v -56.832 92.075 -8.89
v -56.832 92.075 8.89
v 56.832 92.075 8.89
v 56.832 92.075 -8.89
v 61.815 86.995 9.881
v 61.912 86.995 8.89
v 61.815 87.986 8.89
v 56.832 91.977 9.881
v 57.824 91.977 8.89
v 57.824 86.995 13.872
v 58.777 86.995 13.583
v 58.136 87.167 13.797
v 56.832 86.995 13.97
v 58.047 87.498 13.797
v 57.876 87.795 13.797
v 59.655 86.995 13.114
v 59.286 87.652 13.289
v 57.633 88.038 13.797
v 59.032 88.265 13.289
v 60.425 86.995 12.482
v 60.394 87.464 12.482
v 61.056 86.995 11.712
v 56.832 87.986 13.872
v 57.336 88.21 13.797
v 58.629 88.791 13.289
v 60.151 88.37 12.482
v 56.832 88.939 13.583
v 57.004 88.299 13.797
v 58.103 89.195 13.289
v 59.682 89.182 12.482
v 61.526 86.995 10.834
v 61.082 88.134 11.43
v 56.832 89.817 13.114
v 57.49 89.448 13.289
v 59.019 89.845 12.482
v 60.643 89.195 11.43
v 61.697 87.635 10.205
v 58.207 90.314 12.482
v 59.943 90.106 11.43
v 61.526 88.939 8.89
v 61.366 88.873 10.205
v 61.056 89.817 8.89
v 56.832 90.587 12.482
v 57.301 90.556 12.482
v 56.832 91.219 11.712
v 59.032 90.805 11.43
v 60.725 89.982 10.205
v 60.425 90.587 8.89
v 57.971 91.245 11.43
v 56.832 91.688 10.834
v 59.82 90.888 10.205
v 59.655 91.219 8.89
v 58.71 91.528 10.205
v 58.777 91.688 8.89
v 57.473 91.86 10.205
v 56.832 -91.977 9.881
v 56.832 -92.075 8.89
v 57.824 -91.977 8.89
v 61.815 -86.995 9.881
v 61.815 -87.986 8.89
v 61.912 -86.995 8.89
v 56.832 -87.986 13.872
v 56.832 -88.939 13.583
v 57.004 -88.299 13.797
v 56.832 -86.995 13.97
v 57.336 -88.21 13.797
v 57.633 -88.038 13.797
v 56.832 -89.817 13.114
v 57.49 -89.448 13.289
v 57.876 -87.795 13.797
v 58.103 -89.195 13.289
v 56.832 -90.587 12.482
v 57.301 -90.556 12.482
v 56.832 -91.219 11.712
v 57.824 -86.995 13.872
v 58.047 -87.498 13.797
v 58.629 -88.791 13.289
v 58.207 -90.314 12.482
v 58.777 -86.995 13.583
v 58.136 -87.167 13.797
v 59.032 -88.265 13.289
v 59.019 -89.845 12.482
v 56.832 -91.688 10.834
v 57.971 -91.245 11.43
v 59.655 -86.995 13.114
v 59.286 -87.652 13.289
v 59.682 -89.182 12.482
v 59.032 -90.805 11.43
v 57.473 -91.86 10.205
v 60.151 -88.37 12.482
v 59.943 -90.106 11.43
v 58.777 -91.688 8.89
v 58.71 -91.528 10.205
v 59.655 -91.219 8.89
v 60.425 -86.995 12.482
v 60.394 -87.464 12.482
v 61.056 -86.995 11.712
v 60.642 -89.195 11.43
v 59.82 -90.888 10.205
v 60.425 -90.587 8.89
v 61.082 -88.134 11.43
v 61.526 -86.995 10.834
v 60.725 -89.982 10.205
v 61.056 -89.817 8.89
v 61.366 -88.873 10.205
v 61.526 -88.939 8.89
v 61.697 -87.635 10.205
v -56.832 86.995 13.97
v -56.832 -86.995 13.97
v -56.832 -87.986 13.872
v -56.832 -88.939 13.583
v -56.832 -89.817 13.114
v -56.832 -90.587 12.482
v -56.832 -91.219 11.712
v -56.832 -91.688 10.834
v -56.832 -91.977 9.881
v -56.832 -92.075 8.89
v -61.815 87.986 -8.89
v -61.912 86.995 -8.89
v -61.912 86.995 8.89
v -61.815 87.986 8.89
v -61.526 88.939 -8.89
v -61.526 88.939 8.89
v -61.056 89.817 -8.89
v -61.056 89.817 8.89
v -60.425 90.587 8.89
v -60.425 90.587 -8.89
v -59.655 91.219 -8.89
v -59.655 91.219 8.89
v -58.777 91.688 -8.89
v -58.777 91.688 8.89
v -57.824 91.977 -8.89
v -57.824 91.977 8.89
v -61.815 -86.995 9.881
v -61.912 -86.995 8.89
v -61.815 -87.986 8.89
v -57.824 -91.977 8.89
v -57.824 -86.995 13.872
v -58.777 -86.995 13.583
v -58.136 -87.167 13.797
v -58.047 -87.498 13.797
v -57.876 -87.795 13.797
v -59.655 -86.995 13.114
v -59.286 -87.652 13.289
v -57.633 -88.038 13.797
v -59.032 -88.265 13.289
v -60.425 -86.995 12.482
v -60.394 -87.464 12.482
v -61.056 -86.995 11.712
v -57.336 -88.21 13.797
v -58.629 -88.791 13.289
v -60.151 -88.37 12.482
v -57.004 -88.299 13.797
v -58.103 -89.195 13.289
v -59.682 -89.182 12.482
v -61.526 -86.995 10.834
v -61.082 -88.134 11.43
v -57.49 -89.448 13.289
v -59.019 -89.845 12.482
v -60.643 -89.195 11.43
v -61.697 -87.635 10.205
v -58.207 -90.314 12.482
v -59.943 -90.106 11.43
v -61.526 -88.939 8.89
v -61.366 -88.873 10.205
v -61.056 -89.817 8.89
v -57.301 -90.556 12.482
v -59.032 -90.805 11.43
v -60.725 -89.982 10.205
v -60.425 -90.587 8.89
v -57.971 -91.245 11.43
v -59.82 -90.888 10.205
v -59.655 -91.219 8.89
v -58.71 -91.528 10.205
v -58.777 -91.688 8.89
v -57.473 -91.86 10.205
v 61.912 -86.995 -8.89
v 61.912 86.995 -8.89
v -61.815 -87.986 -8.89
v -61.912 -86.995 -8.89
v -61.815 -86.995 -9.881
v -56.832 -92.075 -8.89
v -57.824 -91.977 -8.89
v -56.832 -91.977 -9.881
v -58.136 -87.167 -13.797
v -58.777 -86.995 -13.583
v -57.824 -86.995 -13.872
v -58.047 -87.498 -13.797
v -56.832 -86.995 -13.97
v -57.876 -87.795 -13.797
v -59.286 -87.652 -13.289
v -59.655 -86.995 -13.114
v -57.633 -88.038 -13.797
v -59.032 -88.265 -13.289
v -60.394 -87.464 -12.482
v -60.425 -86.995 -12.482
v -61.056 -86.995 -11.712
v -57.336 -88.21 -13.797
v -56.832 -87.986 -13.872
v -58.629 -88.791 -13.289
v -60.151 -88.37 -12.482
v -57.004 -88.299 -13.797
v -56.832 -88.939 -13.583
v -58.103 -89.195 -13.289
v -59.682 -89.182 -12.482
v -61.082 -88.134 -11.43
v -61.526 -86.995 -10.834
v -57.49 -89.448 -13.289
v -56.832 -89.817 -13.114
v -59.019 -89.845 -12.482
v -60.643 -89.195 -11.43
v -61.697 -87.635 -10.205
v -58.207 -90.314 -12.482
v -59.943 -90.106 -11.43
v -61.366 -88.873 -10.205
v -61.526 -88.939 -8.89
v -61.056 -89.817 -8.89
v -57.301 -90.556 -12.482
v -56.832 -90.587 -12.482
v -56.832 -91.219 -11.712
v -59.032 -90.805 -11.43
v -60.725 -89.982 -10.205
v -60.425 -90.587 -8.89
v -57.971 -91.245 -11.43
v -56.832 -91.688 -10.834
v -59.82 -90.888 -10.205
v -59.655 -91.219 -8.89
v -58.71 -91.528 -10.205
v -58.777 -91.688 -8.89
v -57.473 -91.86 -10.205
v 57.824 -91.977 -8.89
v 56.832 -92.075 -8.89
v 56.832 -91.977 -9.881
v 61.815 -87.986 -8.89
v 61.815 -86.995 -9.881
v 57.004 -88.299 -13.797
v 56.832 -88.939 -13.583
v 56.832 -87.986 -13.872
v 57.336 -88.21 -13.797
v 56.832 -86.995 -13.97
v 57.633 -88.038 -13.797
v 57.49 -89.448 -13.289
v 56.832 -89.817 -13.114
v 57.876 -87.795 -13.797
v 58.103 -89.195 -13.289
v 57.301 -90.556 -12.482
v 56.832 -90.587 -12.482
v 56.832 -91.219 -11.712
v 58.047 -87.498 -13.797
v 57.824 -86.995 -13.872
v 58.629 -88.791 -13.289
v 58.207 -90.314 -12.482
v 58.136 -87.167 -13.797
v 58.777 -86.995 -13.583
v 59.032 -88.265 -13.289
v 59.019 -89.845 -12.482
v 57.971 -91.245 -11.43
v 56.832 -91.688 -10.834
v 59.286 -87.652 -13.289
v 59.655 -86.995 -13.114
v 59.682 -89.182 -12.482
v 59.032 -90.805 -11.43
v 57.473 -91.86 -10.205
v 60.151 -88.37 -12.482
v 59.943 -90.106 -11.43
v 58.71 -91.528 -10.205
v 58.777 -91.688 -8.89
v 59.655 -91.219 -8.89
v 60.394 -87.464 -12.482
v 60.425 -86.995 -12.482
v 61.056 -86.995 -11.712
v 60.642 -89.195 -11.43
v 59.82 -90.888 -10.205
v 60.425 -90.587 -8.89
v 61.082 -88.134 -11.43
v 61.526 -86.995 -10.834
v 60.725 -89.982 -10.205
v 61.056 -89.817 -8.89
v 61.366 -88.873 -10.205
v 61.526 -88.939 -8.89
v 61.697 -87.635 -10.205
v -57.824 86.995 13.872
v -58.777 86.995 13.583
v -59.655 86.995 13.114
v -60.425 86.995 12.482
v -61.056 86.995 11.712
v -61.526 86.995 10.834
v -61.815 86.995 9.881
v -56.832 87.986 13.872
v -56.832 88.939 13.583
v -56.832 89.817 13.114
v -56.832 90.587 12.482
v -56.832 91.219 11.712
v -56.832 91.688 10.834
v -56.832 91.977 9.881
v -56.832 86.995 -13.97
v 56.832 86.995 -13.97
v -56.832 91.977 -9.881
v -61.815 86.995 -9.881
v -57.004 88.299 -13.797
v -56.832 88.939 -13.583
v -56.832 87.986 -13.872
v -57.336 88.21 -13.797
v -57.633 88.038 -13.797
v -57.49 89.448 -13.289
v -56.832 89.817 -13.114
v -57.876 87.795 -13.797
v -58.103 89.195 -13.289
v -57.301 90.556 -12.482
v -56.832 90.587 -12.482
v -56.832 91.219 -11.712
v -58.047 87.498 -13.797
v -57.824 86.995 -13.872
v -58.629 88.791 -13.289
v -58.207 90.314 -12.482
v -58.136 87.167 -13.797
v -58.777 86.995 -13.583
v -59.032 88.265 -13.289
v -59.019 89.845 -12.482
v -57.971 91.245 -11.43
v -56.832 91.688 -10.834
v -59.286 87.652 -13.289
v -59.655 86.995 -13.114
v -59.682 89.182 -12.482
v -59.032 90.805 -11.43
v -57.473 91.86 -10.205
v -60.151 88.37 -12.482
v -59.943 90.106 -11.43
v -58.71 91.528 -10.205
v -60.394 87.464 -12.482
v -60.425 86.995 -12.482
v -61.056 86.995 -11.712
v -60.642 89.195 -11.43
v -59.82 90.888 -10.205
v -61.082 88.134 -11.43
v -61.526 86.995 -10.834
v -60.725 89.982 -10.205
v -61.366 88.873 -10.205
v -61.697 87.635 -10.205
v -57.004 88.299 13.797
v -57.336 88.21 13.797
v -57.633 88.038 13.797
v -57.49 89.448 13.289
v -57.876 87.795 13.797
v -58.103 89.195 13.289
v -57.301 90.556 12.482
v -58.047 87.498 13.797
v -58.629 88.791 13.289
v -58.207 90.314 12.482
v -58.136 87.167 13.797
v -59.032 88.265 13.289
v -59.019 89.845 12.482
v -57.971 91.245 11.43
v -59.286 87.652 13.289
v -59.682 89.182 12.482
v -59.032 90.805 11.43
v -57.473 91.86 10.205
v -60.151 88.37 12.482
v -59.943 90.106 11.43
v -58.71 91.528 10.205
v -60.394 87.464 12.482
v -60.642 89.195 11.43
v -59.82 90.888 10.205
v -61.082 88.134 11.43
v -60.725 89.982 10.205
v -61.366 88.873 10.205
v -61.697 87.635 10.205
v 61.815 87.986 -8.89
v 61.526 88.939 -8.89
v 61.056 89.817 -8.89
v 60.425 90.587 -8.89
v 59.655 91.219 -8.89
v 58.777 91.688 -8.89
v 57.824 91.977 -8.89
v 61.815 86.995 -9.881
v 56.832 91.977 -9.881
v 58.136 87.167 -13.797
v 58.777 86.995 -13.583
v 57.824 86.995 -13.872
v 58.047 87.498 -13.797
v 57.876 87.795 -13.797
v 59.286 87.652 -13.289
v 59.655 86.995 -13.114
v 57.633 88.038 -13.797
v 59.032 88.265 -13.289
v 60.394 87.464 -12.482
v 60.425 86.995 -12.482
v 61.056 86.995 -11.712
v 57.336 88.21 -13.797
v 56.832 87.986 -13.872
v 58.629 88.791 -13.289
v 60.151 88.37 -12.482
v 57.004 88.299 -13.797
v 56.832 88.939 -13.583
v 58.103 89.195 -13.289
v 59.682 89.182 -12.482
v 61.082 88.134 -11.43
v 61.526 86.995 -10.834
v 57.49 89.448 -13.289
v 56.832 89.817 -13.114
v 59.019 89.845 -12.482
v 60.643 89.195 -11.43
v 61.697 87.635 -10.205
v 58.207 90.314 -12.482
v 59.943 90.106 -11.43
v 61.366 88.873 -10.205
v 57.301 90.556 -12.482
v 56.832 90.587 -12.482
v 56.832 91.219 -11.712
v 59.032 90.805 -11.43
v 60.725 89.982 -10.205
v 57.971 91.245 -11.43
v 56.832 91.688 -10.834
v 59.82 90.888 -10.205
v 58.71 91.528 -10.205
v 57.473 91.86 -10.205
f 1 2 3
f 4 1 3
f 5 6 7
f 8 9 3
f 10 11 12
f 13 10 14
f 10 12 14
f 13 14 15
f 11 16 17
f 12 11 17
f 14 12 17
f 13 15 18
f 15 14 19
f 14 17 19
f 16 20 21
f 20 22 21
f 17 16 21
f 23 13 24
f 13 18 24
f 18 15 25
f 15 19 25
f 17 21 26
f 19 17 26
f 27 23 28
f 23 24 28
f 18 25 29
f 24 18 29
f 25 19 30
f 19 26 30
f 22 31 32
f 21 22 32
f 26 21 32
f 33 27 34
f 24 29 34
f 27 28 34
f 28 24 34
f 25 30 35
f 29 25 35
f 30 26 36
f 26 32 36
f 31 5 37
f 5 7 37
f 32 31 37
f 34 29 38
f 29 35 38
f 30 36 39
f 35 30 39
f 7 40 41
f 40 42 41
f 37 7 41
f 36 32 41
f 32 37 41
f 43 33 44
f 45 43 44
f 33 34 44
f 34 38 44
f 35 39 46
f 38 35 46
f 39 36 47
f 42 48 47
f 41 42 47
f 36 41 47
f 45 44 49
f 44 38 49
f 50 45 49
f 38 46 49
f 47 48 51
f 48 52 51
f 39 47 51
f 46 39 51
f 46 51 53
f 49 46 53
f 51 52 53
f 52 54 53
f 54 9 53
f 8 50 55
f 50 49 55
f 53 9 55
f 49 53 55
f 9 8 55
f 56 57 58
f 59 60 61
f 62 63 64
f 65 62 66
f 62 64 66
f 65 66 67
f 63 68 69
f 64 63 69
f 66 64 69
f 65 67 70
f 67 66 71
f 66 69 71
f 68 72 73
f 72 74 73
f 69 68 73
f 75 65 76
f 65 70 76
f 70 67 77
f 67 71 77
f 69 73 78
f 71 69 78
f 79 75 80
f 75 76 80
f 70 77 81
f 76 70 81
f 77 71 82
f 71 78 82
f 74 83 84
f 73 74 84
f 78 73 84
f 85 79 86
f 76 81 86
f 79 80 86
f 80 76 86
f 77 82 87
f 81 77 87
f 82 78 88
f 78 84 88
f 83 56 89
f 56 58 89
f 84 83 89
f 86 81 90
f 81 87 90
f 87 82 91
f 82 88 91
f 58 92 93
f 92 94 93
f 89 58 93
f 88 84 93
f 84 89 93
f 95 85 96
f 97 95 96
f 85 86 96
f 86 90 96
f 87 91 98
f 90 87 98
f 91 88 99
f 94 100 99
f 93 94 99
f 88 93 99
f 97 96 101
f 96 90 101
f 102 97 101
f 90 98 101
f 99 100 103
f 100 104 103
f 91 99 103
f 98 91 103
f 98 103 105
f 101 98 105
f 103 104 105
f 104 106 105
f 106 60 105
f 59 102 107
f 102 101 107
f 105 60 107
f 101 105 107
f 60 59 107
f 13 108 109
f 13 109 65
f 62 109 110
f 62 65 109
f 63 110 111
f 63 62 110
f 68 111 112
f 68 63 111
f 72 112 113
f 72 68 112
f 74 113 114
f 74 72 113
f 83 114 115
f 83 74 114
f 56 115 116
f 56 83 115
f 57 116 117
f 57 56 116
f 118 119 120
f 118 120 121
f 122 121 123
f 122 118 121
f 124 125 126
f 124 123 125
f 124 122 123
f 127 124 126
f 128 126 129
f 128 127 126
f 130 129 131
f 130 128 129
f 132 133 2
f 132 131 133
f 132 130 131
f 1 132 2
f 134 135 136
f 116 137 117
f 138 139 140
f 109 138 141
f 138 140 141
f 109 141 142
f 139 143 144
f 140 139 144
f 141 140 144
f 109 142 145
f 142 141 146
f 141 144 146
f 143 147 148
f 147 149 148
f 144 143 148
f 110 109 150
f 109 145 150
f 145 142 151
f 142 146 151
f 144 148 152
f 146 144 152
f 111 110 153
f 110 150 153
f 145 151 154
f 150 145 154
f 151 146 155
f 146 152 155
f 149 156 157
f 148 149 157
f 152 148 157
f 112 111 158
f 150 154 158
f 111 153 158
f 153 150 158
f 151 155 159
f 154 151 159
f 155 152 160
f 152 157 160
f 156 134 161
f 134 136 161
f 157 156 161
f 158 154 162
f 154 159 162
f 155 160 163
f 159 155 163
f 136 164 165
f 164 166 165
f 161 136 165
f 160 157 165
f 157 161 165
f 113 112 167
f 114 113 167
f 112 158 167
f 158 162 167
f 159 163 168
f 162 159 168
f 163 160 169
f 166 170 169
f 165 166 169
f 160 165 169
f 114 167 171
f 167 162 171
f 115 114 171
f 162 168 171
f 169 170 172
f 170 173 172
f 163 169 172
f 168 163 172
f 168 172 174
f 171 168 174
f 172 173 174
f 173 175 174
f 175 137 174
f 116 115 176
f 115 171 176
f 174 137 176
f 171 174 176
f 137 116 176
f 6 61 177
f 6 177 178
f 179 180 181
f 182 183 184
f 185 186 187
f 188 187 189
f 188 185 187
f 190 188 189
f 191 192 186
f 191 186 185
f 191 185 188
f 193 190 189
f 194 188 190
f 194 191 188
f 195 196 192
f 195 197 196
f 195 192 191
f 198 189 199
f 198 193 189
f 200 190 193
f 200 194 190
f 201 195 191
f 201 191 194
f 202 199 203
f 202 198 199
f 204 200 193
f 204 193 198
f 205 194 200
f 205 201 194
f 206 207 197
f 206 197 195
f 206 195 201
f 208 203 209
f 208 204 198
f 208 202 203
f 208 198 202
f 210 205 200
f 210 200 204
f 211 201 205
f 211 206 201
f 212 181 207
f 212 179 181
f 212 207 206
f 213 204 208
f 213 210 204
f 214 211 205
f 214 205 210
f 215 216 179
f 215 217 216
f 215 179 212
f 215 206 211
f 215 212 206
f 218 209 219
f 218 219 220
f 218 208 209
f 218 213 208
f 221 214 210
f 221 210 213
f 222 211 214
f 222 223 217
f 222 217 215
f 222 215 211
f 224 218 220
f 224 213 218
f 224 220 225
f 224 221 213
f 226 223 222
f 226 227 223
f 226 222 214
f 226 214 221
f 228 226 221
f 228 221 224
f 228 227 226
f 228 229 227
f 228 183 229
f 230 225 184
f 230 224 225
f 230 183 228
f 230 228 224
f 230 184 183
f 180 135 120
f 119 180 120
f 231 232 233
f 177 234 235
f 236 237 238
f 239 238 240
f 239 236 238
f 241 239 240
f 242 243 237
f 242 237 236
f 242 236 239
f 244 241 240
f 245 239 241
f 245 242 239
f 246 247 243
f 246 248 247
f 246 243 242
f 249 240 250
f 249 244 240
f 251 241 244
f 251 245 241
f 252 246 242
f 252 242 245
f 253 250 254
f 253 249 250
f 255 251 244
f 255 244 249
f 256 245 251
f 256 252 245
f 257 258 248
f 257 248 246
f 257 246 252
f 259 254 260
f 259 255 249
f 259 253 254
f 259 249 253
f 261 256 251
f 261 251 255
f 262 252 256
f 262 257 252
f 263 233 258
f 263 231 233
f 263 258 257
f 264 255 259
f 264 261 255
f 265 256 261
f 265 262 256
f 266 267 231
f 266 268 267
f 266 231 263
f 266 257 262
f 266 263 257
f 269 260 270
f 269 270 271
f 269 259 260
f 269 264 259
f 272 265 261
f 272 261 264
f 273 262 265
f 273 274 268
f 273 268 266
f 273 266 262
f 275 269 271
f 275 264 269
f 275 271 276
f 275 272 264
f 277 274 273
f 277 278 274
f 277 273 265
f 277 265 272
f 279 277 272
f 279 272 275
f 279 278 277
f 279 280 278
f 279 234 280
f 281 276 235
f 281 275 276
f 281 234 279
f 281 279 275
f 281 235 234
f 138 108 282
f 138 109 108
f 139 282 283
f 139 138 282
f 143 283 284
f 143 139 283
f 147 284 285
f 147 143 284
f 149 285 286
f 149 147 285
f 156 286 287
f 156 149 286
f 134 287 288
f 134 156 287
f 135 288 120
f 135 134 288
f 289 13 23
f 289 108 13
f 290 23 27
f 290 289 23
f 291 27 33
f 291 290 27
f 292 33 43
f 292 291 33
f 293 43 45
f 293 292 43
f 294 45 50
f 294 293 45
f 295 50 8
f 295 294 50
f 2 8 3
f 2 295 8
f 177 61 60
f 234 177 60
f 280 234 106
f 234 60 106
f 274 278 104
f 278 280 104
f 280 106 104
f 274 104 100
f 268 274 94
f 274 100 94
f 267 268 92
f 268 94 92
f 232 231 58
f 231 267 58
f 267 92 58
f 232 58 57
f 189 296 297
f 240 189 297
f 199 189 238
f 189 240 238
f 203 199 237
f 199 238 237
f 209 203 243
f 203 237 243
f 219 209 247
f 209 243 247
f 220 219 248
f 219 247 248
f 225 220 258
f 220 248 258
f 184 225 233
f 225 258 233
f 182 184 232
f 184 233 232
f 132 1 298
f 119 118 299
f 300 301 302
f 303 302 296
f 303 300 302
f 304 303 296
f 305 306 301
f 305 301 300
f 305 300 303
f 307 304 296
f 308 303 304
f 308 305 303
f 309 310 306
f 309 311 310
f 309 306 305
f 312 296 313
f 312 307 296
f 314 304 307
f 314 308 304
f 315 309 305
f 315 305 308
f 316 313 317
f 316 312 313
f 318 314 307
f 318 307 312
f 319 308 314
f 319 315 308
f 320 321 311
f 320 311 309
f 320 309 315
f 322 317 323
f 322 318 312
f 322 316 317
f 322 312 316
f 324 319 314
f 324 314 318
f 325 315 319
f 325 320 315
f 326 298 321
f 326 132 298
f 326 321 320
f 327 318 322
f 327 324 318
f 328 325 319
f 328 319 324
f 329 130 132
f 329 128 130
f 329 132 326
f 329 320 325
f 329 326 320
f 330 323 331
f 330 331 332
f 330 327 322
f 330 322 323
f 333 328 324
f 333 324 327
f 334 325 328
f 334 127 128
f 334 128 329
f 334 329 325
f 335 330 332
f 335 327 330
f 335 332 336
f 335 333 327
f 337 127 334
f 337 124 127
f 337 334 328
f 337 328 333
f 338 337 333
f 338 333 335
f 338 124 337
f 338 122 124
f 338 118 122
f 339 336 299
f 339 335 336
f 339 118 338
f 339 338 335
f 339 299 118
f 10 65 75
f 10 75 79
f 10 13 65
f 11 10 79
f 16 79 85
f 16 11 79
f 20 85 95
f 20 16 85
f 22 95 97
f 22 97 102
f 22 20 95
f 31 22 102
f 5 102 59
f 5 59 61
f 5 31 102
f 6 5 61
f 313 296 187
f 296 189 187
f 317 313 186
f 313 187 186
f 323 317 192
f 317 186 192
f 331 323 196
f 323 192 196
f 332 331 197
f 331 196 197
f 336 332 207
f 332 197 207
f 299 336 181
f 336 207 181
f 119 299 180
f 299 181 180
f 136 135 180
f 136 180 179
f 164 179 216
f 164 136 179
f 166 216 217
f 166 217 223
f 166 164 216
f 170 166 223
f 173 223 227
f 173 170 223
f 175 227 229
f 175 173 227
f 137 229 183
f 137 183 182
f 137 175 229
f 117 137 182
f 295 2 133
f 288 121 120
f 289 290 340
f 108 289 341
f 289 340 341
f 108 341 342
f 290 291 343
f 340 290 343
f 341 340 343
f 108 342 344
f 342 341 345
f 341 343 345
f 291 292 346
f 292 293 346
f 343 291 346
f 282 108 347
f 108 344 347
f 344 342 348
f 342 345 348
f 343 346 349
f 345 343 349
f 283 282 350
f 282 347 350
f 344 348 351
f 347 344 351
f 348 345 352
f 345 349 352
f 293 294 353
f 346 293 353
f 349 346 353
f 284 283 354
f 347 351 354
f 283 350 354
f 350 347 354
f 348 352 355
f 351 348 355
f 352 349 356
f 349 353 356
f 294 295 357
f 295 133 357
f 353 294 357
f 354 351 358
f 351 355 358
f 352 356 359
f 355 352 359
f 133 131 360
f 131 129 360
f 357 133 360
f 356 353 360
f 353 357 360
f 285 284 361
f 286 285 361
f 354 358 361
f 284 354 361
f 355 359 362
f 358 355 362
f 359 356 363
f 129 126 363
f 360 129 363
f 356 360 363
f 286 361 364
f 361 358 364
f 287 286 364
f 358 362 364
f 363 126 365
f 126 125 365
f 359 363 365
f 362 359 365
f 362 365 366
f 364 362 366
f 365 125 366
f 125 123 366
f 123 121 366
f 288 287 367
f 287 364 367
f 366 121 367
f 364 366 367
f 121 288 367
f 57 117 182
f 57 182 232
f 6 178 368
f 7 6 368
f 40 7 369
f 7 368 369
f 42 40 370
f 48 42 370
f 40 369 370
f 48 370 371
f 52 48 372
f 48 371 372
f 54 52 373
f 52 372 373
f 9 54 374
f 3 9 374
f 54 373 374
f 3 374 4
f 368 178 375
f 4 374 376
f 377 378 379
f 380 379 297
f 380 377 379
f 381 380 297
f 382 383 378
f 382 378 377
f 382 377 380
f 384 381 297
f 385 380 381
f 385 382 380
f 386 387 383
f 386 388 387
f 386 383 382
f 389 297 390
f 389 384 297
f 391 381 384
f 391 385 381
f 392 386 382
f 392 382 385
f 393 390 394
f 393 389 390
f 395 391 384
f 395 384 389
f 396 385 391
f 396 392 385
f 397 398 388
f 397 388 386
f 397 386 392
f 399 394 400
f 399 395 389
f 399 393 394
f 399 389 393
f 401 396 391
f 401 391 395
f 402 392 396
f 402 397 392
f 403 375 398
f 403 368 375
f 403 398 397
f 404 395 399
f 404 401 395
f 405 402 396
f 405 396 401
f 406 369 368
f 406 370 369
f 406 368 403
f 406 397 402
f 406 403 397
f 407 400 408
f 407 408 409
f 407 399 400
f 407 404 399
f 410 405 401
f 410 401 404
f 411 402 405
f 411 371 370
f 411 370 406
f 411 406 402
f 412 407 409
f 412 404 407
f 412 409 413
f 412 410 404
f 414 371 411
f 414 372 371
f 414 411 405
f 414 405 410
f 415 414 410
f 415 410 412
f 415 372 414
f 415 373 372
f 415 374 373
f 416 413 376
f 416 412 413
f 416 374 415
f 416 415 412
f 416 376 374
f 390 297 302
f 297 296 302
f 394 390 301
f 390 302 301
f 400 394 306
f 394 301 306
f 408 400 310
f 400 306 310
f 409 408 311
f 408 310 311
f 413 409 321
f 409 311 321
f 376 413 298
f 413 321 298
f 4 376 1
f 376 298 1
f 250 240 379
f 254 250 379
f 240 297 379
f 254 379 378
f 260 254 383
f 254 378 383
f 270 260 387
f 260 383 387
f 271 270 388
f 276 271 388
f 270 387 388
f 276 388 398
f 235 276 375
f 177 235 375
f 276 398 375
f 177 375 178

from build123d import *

# Parameters (mm, degrees)
F0_W     = 123.825
F0_H     = 184.15
F1_DEPTH = 13.97
F2_R     = 5.08
F3_R     = 5.08


with BuildPart() as f1:
    # F0 (on Top) → F1 (new body, symmetric)
    with BuildSketch(Plane.XY):
        Rectangle(F0_W, F0_H)
    extrude(amount=F1_DEPTH, both=True)

    # F2
    f2_edges = [f1.edges().sort_by_distance(p)[0] for p in [
        (-61.9125, -92.075, 0),
        (61.9125, -92.075, 0),
        (61.9125, 92.075, 0),
        (-61.9125, 92.075, 0),
    ]]
    fillet(f2_edges, radius=F2_R)

    # F3
    f3_edges = [f1.edges().sort_by_distance(p)[0] for p in [
        (61.9125, 0, 13.97),
        (61.9125, 0, -13.97),
    ]]
    fillet(f3_edges, radius=F3_R)


solid = f1.part
